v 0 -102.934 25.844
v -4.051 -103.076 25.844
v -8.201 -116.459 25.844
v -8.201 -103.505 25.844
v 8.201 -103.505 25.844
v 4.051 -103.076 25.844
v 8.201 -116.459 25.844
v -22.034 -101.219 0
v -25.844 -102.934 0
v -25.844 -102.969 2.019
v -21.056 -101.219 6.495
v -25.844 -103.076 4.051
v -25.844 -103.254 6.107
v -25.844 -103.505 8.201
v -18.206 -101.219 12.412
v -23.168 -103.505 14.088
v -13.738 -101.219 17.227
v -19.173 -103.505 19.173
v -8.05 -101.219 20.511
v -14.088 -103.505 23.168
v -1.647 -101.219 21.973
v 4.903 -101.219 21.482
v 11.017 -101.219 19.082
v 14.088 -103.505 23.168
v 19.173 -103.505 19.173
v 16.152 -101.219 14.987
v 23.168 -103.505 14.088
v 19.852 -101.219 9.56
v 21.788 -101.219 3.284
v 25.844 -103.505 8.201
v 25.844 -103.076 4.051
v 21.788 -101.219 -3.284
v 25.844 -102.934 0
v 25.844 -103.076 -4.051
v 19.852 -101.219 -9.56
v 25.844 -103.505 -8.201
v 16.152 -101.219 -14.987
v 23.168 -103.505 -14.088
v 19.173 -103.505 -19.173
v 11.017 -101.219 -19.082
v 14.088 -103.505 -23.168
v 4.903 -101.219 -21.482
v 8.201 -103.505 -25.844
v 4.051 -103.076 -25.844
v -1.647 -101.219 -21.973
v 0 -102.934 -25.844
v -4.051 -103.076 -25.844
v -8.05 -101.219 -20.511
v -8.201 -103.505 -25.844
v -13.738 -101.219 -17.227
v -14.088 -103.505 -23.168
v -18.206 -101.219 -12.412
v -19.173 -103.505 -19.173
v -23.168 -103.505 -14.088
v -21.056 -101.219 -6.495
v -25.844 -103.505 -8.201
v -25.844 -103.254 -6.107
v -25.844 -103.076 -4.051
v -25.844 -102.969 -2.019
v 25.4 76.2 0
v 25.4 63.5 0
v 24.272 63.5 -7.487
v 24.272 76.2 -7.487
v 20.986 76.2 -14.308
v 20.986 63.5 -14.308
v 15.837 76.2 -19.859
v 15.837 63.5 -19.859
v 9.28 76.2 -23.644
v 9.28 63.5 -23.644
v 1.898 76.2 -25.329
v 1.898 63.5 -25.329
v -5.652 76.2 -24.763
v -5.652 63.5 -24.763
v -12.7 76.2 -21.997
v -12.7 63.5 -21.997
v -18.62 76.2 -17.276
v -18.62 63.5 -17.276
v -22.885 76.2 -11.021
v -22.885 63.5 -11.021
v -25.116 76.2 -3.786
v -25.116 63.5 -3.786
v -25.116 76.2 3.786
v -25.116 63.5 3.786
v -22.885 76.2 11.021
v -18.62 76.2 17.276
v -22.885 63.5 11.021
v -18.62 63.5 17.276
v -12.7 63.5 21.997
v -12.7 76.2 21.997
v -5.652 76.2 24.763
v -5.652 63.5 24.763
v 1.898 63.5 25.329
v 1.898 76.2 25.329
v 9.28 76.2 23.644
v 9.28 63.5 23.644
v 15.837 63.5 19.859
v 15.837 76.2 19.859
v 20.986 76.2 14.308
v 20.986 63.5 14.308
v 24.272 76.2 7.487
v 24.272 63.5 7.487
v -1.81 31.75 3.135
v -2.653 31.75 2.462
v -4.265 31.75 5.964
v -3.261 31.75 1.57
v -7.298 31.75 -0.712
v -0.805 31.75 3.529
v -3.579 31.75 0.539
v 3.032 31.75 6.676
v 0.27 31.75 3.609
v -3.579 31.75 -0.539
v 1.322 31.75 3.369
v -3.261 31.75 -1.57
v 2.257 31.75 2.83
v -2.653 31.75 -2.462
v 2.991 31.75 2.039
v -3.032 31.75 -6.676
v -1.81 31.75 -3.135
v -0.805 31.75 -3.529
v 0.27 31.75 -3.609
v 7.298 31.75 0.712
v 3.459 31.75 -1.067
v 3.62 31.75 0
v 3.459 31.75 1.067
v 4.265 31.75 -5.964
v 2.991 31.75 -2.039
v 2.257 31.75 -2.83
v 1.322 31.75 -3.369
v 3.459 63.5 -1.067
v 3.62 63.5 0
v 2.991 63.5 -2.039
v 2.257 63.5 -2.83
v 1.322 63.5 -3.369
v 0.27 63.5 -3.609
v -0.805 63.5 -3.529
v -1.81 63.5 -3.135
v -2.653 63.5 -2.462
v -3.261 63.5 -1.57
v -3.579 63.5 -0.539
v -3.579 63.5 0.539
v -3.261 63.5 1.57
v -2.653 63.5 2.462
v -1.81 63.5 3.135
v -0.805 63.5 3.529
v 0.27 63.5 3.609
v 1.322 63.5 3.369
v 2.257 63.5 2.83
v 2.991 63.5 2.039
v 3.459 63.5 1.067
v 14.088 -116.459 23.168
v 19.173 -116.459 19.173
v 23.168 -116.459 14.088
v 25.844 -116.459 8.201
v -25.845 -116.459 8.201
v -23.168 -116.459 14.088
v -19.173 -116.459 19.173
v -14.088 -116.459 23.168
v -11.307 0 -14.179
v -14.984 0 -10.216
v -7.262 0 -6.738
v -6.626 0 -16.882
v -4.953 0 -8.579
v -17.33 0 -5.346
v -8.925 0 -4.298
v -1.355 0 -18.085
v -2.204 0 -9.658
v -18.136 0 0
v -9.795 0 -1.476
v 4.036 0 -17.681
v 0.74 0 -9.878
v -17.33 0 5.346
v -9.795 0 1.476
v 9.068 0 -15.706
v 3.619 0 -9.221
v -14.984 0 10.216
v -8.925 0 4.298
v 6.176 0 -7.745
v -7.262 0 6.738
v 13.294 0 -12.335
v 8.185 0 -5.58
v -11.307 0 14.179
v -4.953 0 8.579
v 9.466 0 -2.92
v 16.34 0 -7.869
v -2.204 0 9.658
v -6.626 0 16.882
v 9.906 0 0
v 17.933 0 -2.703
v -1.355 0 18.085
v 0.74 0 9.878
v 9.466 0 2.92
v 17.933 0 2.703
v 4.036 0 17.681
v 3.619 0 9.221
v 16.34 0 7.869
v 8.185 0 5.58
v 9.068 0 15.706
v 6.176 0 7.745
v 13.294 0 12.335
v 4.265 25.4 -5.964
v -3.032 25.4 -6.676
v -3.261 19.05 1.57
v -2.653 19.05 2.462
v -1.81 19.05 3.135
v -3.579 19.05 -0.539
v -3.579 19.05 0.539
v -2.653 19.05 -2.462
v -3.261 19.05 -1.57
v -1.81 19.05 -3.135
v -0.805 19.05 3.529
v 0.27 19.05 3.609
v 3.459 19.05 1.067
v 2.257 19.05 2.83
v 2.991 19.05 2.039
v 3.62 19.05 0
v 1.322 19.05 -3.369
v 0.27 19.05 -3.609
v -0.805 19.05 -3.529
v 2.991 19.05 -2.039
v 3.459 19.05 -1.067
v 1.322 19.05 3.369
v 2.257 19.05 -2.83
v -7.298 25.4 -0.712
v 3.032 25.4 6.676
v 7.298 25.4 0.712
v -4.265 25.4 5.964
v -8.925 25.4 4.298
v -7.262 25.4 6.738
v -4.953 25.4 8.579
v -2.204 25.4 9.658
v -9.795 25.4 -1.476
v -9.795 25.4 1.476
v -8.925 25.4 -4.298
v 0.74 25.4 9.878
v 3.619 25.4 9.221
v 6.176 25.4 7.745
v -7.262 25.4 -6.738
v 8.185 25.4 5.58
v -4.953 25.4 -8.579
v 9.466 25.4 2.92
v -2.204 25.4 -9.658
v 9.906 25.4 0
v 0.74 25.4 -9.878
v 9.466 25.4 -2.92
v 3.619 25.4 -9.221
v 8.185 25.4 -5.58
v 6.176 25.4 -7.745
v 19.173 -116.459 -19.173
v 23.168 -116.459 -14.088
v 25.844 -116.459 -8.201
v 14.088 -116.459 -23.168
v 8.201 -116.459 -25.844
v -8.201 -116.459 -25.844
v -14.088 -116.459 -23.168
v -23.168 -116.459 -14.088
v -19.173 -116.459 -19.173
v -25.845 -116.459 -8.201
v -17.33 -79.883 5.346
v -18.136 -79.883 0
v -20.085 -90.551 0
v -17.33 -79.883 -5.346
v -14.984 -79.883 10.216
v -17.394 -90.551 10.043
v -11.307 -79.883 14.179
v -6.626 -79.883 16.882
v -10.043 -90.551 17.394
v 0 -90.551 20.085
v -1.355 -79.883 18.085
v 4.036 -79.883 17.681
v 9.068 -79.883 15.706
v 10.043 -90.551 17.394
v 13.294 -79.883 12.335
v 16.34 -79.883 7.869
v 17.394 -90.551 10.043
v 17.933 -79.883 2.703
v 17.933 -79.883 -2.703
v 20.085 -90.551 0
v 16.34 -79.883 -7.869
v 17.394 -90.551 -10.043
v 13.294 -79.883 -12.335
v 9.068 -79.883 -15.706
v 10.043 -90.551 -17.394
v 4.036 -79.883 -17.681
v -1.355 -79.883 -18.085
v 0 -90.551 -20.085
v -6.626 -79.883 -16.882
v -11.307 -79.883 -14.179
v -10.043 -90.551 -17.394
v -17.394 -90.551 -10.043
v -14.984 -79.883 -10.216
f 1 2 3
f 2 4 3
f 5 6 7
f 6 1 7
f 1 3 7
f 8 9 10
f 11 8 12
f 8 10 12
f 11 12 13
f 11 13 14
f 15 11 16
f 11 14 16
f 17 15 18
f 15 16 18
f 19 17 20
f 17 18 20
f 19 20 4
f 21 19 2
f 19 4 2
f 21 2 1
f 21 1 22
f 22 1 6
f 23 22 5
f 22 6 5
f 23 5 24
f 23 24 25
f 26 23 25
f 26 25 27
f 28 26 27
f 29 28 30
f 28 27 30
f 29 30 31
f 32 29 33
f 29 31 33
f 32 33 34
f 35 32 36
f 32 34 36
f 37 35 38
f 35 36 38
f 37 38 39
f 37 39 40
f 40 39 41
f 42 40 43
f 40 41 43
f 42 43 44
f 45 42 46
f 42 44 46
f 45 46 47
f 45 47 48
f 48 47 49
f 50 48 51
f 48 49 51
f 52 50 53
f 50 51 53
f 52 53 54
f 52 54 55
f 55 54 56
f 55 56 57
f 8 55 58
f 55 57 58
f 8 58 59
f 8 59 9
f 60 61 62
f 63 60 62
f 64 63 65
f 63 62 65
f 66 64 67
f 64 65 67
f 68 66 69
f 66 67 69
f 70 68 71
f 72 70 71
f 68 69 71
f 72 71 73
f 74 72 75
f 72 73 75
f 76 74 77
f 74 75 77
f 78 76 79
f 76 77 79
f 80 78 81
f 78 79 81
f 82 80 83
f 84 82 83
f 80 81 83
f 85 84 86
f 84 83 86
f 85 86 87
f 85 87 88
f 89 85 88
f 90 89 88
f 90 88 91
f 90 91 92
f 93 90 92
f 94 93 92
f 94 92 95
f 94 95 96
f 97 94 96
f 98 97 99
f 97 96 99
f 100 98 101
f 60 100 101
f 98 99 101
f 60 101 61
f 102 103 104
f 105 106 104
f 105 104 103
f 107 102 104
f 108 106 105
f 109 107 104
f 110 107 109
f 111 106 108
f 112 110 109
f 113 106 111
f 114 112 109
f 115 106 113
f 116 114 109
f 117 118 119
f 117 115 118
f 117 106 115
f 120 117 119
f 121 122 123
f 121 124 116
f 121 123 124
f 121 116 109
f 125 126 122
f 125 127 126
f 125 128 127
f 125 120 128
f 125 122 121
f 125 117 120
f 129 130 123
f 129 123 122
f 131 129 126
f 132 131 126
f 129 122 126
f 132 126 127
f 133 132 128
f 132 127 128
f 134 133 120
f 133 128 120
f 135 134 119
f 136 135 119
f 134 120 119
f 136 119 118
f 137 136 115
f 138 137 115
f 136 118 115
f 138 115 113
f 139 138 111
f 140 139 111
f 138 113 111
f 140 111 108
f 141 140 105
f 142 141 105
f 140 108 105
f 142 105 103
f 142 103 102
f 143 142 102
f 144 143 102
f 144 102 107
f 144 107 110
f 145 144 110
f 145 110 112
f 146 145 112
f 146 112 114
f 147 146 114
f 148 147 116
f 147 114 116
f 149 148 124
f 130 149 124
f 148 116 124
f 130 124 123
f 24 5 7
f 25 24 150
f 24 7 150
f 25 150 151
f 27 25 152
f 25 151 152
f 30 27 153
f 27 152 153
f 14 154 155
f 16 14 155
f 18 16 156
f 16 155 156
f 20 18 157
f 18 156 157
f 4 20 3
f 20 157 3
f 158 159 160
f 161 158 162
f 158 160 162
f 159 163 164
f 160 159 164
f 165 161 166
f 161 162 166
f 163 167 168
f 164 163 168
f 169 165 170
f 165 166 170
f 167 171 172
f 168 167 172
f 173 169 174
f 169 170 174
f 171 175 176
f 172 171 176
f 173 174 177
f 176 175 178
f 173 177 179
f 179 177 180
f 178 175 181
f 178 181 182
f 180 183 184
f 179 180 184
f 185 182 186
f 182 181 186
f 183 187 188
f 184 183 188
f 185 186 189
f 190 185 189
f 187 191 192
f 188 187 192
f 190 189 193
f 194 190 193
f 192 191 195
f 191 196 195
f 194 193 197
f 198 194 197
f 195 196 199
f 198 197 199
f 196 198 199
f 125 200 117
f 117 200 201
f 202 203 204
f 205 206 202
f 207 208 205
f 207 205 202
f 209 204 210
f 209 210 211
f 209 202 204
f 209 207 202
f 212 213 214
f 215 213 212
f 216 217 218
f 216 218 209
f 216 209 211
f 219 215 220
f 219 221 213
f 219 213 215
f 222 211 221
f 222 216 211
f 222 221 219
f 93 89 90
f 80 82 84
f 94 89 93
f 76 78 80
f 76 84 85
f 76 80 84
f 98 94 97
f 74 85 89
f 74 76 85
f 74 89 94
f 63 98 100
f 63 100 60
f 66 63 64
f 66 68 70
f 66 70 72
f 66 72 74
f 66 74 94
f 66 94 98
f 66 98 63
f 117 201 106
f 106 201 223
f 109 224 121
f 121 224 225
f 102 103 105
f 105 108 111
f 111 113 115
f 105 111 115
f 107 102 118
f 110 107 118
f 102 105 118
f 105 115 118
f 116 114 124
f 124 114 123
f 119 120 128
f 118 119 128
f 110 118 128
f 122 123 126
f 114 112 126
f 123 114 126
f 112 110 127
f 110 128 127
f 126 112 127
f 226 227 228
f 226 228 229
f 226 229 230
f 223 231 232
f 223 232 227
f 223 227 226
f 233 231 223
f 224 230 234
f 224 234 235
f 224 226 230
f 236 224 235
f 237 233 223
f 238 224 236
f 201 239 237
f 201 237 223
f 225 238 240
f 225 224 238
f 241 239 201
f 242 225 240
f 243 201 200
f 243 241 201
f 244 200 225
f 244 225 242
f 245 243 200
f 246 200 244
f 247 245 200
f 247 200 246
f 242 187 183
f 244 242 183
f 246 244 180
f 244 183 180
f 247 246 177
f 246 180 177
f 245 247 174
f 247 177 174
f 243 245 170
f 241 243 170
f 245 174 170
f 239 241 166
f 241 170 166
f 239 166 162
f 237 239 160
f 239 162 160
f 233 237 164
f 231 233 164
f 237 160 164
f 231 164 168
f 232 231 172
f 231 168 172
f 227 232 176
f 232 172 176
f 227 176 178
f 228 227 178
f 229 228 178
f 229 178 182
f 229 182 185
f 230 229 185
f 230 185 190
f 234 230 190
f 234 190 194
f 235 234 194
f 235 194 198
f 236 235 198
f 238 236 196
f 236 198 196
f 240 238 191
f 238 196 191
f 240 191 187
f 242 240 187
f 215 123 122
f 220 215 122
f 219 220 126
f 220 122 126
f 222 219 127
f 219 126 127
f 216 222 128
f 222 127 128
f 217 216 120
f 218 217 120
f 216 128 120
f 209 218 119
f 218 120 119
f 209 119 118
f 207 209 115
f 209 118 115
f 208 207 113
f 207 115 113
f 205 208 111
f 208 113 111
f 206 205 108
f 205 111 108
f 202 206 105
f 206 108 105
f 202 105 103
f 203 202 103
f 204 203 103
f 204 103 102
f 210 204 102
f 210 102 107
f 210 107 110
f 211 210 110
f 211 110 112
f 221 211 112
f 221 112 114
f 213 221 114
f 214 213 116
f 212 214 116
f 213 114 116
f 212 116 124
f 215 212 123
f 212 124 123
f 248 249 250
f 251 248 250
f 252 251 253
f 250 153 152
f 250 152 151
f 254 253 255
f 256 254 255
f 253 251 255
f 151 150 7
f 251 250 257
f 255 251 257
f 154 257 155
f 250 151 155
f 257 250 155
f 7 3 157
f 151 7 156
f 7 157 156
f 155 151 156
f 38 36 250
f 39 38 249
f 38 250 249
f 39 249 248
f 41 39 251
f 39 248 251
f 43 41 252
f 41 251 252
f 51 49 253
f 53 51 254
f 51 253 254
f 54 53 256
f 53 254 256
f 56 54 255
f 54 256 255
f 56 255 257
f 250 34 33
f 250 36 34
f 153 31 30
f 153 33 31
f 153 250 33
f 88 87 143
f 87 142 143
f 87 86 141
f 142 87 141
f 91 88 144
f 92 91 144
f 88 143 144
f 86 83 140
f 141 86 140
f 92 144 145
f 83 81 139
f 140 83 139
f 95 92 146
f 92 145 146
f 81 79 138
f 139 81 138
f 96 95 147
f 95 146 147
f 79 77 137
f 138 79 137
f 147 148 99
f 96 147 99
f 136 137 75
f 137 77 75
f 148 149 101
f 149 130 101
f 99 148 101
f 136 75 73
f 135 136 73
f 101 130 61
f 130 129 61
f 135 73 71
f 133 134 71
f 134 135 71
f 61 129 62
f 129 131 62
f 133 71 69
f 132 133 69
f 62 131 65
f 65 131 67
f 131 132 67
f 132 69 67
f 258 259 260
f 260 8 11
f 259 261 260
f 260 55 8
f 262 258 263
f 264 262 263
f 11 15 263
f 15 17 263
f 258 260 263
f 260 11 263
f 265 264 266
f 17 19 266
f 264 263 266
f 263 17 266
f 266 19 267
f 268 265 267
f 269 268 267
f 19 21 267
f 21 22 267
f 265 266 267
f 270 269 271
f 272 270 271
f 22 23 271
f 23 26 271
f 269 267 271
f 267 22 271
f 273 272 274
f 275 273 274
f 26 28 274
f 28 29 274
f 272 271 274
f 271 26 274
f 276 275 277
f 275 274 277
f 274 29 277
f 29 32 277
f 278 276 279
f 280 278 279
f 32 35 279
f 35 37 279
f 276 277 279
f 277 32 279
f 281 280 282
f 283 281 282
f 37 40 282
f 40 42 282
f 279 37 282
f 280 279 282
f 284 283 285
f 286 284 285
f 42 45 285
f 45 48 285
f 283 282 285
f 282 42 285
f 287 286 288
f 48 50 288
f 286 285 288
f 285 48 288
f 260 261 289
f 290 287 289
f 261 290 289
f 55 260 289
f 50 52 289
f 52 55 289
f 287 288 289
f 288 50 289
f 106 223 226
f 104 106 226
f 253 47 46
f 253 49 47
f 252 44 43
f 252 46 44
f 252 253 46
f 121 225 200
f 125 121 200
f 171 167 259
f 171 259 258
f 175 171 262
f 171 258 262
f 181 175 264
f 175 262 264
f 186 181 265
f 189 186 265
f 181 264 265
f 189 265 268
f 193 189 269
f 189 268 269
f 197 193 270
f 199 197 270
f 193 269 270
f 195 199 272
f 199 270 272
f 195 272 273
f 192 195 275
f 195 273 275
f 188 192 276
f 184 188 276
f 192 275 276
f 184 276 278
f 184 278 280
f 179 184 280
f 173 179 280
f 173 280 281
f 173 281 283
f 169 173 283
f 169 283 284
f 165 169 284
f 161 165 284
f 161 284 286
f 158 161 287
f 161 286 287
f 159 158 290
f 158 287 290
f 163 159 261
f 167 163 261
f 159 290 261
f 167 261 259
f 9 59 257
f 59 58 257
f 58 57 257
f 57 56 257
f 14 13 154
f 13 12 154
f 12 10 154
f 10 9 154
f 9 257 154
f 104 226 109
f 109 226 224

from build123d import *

# Parameters (mm, degrees)
SKETCH2_OUTSIDE_W   = 84.116
SKETCH2_OUTSIDE_H   = 84.116
SKETCH2_OUTSIDE_W_2 = 51.689
SKETCH2_OUTSIDE_H_2 = 51.689
EXTRUDE1_DEPTH      = 17.78
SKETCH3_R           = 9.906
EXTRUDE2_DEPTH      = 25.4
EXTRUDE3_DEPTH      = 6.35
SKETCH5_R           = 3.6195
EXTRUDE4_DEPTH      = 12.7
SKETCH6_R           = 3.6195
EXTRUDE5_DEPTH      = 31.75
SKETCH7_R           = 25.4
EXTRUDE6_DEPTH      = 12.7


with BuildPart() as part:
    # Sketch1 → Revolve1 (revolve)
    with BuildSketch(Plane.XY):
        Polygon((0, 0), (-18.1356, 0), (-18.1356, -79.883), (-22.0345, -101.219), (-27.1145, -103.505), (-27.1145, -116.459), (0, -116.459), align=None)
    revolve(axis=Axis((0, -116.459, 0), (0, 1, 0)))

    # Sketch2 outside → Extrude1 (cut)
    with BuildSketch(Plane.XZ.offset(116.459)):
        Rectangle(SKETCH2_OUTSIDE_W, SKETCH2_OUTSIDE_H)
        Rectangle(SKETCH2_OUTSIDE_W_2, SKETCH2_OUTSIDE_H_2, mode=Mode.SUBTRACT)
    extrude(amount=-EXTRUDE1_DEPTH, mode=Mode.SUBTRACT)

    # Sketch3 → Extrude2 (add)
    with BuildSketch(Plane(origin=(0, 0, 0), x_dir=(1, 0, 0), z_dir=(0, 1, 0))):
        Circle(SKETCH3_R)
    extrude(amount=EXTRUDE2_DEPTH)

    # Sketch4 → Extrude3 (add)
    with BuildSketch(Plane(origin=(0, 25.4, 0), x_dir=(1, 0, 0), z_dir=(0, 1, 0))):
        Polygon((-4.265485733, -5.963972233), (3.032208595, -6.676005121), (7.297694328, -0.712032888), (4.265485733, 5.963972233), (-3.032208595, 6.676005121), (-7.297694328, 0.712032888), align=None)
    extrude(amount=EXTRUDE3_DEPTH)

    # Sketch5 → Extrude4 (cut)
    with BuildSketch(Plane(origin=(0, 31.75, 0), x_dir=(1, 0, 0), z_dir=(0, 1, 0))):
        Circle(SKETCH5_R)
    extrude(amount=-EXTRUDE4_DEPTH, mode=Mode.SUBTRACT)


with BuildPart() as body_2:
    # Sketch6 → Extrude5 (new body)
    with BuildSketch(Plane(origin=(0, 31.75, 0), x_dir=(1, 0, 0), z_dir=(0, 1, 0))):
        Circle(SKETCH6_R)
    extrude(amount=EXTRUDE5_DEPTH)

    # Sketch7 → Extrude6 (add)
    with BuildSketch(Plane(origin=(0, 63.5, 0), x_dir=(1, 0, 0), z_dir=(0, 1, 0))):
        Circle(SKETCH7_R)
    extrude(amount=EXTRUDE6_DEPTH)


solid = Compound([part.part, body_2.part])
